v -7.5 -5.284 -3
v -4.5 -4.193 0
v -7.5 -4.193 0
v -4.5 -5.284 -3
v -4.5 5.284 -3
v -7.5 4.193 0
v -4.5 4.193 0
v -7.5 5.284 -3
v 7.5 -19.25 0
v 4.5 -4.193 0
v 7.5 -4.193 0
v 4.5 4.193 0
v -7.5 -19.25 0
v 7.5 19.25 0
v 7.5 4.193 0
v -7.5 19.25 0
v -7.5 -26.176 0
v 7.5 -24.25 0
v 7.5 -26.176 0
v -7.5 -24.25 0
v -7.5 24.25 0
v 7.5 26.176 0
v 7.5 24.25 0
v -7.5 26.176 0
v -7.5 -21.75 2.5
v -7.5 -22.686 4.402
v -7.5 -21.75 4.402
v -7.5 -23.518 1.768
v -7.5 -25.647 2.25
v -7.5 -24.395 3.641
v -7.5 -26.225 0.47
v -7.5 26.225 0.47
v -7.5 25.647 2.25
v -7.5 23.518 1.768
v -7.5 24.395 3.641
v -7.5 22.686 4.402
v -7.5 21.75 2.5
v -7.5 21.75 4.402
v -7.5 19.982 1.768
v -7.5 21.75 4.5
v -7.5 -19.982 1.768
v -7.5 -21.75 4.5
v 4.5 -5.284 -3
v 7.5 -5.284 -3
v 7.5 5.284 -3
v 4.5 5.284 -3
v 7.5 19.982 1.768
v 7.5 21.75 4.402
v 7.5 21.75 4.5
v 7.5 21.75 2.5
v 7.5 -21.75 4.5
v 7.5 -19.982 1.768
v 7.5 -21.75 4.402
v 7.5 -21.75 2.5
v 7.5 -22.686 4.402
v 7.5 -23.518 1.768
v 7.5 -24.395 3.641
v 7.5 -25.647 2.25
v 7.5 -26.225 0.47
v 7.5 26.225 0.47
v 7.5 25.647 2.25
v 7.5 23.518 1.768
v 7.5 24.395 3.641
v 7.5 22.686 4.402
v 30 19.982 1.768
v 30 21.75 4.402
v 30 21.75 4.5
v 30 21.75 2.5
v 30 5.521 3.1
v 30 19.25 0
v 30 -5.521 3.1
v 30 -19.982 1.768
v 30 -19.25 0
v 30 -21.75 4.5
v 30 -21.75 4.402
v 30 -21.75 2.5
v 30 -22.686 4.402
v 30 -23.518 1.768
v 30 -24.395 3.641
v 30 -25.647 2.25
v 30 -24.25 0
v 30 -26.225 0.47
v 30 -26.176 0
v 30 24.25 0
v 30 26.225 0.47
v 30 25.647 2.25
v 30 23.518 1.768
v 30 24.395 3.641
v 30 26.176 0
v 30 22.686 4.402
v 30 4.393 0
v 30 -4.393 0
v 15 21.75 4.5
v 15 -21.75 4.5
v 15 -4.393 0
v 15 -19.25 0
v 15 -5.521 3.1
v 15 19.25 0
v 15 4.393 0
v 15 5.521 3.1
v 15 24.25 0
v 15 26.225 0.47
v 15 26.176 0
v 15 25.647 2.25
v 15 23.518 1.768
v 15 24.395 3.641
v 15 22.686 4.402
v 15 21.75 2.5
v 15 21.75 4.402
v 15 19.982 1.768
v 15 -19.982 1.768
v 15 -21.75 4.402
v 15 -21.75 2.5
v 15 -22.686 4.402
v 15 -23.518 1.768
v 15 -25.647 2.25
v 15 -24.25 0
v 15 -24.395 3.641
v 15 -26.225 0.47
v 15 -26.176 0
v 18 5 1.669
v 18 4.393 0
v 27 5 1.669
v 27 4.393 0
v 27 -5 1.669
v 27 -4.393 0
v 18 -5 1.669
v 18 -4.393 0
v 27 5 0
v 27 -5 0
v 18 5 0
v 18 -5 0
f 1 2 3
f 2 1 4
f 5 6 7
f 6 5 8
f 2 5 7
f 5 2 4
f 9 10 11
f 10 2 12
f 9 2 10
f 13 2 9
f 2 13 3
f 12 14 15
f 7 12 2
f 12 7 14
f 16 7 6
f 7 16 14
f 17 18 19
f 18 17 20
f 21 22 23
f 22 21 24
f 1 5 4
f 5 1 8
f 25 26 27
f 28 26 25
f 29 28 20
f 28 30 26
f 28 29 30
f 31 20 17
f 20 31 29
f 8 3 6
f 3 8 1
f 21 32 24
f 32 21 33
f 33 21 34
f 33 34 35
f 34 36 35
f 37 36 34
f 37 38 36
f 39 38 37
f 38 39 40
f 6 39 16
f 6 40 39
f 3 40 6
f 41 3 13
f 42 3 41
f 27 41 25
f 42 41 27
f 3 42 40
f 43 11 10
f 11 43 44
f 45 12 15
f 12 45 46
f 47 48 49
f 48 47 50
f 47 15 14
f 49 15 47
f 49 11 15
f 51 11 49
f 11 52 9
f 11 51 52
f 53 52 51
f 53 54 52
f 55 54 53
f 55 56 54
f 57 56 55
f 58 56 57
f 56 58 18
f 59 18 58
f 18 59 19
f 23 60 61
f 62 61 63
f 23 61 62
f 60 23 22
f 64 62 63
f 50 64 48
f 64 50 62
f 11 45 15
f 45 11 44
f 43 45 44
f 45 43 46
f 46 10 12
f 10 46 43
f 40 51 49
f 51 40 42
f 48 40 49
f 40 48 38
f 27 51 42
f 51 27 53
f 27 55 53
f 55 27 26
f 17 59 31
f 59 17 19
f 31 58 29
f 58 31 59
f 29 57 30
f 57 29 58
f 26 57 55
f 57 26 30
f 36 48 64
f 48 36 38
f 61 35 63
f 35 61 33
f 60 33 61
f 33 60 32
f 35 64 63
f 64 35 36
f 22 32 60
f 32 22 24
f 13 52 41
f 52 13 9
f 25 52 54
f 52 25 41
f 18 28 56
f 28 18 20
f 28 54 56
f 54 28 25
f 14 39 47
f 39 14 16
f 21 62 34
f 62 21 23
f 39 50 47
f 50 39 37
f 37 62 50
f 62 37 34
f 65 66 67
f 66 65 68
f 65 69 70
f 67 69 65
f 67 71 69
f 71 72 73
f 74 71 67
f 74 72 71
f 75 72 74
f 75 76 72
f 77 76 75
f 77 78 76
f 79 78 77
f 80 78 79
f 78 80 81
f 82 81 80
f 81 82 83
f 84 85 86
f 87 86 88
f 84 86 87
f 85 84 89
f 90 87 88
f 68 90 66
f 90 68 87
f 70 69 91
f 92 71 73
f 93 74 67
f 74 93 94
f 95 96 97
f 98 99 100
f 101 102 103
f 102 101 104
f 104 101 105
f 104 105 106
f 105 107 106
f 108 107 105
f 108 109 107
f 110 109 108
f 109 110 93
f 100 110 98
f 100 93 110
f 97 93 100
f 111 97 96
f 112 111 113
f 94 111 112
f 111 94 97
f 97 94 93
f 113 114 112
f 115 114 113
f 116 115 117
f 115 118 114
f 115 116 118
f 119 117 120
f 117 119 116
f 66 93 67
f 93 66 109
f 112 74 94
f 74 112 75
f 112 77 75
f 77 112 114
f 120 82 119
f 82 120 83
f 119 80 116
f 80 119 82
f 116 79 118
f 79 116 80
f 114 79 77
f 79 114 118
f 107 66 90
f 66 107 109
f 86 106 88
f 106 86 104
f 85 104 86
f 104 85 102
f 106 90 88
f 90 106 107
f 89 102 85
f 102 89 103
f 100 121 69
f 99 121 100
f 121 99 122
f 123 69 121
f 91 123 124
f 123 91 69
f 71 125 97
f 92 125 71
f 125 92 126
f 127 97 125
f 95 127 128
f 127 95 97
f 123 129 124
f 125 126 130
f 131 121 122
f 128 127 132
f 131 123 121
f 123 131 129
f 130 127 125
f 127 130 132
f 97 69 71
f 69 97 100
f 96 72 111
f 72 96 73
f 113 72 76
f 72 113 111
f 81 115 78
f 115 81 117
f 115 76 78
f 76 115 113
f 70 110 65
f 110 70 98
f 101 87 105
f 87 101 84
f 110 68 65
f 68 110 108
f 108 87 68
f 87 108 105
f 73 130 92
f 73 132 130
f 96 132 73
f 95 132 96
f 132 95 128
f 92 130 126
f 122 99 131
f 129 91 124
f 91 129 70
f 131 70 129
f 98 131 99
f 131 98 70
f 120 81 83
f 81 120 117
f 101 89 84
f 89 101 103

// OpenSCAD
// [FL_INDEX: keywords="openscad, 3d_parametric, Clips_for_fixing_twisted_bag_strap___OpenSCAD, csg_solid" | COT="Parametric OpenSCAD design from 3DCodeverse"]
// Title: Clips for fixing twisted bag strap! (OpenSCAD)

x = 15; // [10:50]
y = 43.5; // [25:75]
z = 9; // [5:15]


union() { 

intersection() { translate(v = [-(x-3)/2, 0, -(z/6)]) cube(size = [3,(y+20),(z/3)], center = true);
union() { translate(v = [-(x-3)/2, -1, 0]) rotate(a=[70,0,0]) cube(size = [10,(y+20),(z/1.5)], center = true);
translate(v = [-(x-3)/2, 1, 0]) rotate(a=[-70,0,0]) cube(size = [10,(y+20),(z/1.5)], center = true); } }

intersection() { translate(v = [(x-3)/2, 0, -(z/6)]) cube(size = [3,(y+20),(z/3)], center = true);
union() { translate(v = [(x-3)/2, -1, 0]) rotate(a=[70,0,0]) cube(size = [10,(y+20),(z/1.5)], center = true);
translate(v = [(x-3)/2, 1, 0]) rotate(a=[-70,0,0]) cube(size = [10,(y+20),(z/1.5)], center = true); } }


difference() { union() { cube(size = [x,y,z], center = true);
translate(v = [0, -(y/2), 0]) rotate(a=[90,90,90]) cylinder(h = x, r=(z/2), center = true);
translate(v = [0, (y/2), 0]) rotate(a=[90,90,90]) cylinder(h = x, r=(z/2), center = true); }

union() { translate(v = [0, -(y/2), 0]) rotate(a=[90,90,90]) cylinder(h = (x+10), r=(z/3.6), center = true);
translate(v = [0, (y/2), 0]) rotate(a=[90,90,90]) cylinder(h = (x+10), r=(z/3.6), center = true); 

translate(v = [0, 0, -(z/4)-1]) cube(size = [(x+40),(y+40),(z/2)+2], center = true); } } }



difference() { 

union() { translate(v = [x+(x/2), 0, 0]) cube(size = [x,y,z], center = true);

translate(v = [x+(x/2), -(y/2), 0]) rotate(a=[90,90,90]) cylinder(h = x, r=(z/2), center = true);

translate(v = [x+(x/2), (y/2), 0]) rotate(a=[90,90,90]) cylinder(h = x, r=(z/2), center = true); }

union() { translate(v = [x+(x/2), -(y/2), 0]) rotate(a=[90,90,90]) cylinder(h = (x+5), r=(z/3.6), center = true);

translate(v = [x+(x/2), (y/2), 0]) rotate(a=[90,90,90]) cylinder(h = (x+5), r=(z/3.6), center = true); 

translate(v = [x+(x/2), 0, -(z/4)-1]) cube(size = [(x+40),(y+40),(z/2)+2], center = true);

intersection() { translate(v = [x+(x/2), 0, z/6]) cube(size = [(x+5),(y+11),(z/3)+0.2], center = true);

union() { translate(v = [x+(x/2), 1.2, 0]) rotate(a=[70,0,0]) cube(size = [(x+5),(y+11),(z/1.5)], center = true);

translate(v = [x+(x/2), -1.2, 0]) rotate(a=[-70,0,0]) cube(size = [(x+5),(y+11),(z/1.5)], center = true);

translate(v = [x+(x/2), 0, 1]) cube(size = [(x-6),(z+1),(z/3)+0.2], center = true); } }

}

}
